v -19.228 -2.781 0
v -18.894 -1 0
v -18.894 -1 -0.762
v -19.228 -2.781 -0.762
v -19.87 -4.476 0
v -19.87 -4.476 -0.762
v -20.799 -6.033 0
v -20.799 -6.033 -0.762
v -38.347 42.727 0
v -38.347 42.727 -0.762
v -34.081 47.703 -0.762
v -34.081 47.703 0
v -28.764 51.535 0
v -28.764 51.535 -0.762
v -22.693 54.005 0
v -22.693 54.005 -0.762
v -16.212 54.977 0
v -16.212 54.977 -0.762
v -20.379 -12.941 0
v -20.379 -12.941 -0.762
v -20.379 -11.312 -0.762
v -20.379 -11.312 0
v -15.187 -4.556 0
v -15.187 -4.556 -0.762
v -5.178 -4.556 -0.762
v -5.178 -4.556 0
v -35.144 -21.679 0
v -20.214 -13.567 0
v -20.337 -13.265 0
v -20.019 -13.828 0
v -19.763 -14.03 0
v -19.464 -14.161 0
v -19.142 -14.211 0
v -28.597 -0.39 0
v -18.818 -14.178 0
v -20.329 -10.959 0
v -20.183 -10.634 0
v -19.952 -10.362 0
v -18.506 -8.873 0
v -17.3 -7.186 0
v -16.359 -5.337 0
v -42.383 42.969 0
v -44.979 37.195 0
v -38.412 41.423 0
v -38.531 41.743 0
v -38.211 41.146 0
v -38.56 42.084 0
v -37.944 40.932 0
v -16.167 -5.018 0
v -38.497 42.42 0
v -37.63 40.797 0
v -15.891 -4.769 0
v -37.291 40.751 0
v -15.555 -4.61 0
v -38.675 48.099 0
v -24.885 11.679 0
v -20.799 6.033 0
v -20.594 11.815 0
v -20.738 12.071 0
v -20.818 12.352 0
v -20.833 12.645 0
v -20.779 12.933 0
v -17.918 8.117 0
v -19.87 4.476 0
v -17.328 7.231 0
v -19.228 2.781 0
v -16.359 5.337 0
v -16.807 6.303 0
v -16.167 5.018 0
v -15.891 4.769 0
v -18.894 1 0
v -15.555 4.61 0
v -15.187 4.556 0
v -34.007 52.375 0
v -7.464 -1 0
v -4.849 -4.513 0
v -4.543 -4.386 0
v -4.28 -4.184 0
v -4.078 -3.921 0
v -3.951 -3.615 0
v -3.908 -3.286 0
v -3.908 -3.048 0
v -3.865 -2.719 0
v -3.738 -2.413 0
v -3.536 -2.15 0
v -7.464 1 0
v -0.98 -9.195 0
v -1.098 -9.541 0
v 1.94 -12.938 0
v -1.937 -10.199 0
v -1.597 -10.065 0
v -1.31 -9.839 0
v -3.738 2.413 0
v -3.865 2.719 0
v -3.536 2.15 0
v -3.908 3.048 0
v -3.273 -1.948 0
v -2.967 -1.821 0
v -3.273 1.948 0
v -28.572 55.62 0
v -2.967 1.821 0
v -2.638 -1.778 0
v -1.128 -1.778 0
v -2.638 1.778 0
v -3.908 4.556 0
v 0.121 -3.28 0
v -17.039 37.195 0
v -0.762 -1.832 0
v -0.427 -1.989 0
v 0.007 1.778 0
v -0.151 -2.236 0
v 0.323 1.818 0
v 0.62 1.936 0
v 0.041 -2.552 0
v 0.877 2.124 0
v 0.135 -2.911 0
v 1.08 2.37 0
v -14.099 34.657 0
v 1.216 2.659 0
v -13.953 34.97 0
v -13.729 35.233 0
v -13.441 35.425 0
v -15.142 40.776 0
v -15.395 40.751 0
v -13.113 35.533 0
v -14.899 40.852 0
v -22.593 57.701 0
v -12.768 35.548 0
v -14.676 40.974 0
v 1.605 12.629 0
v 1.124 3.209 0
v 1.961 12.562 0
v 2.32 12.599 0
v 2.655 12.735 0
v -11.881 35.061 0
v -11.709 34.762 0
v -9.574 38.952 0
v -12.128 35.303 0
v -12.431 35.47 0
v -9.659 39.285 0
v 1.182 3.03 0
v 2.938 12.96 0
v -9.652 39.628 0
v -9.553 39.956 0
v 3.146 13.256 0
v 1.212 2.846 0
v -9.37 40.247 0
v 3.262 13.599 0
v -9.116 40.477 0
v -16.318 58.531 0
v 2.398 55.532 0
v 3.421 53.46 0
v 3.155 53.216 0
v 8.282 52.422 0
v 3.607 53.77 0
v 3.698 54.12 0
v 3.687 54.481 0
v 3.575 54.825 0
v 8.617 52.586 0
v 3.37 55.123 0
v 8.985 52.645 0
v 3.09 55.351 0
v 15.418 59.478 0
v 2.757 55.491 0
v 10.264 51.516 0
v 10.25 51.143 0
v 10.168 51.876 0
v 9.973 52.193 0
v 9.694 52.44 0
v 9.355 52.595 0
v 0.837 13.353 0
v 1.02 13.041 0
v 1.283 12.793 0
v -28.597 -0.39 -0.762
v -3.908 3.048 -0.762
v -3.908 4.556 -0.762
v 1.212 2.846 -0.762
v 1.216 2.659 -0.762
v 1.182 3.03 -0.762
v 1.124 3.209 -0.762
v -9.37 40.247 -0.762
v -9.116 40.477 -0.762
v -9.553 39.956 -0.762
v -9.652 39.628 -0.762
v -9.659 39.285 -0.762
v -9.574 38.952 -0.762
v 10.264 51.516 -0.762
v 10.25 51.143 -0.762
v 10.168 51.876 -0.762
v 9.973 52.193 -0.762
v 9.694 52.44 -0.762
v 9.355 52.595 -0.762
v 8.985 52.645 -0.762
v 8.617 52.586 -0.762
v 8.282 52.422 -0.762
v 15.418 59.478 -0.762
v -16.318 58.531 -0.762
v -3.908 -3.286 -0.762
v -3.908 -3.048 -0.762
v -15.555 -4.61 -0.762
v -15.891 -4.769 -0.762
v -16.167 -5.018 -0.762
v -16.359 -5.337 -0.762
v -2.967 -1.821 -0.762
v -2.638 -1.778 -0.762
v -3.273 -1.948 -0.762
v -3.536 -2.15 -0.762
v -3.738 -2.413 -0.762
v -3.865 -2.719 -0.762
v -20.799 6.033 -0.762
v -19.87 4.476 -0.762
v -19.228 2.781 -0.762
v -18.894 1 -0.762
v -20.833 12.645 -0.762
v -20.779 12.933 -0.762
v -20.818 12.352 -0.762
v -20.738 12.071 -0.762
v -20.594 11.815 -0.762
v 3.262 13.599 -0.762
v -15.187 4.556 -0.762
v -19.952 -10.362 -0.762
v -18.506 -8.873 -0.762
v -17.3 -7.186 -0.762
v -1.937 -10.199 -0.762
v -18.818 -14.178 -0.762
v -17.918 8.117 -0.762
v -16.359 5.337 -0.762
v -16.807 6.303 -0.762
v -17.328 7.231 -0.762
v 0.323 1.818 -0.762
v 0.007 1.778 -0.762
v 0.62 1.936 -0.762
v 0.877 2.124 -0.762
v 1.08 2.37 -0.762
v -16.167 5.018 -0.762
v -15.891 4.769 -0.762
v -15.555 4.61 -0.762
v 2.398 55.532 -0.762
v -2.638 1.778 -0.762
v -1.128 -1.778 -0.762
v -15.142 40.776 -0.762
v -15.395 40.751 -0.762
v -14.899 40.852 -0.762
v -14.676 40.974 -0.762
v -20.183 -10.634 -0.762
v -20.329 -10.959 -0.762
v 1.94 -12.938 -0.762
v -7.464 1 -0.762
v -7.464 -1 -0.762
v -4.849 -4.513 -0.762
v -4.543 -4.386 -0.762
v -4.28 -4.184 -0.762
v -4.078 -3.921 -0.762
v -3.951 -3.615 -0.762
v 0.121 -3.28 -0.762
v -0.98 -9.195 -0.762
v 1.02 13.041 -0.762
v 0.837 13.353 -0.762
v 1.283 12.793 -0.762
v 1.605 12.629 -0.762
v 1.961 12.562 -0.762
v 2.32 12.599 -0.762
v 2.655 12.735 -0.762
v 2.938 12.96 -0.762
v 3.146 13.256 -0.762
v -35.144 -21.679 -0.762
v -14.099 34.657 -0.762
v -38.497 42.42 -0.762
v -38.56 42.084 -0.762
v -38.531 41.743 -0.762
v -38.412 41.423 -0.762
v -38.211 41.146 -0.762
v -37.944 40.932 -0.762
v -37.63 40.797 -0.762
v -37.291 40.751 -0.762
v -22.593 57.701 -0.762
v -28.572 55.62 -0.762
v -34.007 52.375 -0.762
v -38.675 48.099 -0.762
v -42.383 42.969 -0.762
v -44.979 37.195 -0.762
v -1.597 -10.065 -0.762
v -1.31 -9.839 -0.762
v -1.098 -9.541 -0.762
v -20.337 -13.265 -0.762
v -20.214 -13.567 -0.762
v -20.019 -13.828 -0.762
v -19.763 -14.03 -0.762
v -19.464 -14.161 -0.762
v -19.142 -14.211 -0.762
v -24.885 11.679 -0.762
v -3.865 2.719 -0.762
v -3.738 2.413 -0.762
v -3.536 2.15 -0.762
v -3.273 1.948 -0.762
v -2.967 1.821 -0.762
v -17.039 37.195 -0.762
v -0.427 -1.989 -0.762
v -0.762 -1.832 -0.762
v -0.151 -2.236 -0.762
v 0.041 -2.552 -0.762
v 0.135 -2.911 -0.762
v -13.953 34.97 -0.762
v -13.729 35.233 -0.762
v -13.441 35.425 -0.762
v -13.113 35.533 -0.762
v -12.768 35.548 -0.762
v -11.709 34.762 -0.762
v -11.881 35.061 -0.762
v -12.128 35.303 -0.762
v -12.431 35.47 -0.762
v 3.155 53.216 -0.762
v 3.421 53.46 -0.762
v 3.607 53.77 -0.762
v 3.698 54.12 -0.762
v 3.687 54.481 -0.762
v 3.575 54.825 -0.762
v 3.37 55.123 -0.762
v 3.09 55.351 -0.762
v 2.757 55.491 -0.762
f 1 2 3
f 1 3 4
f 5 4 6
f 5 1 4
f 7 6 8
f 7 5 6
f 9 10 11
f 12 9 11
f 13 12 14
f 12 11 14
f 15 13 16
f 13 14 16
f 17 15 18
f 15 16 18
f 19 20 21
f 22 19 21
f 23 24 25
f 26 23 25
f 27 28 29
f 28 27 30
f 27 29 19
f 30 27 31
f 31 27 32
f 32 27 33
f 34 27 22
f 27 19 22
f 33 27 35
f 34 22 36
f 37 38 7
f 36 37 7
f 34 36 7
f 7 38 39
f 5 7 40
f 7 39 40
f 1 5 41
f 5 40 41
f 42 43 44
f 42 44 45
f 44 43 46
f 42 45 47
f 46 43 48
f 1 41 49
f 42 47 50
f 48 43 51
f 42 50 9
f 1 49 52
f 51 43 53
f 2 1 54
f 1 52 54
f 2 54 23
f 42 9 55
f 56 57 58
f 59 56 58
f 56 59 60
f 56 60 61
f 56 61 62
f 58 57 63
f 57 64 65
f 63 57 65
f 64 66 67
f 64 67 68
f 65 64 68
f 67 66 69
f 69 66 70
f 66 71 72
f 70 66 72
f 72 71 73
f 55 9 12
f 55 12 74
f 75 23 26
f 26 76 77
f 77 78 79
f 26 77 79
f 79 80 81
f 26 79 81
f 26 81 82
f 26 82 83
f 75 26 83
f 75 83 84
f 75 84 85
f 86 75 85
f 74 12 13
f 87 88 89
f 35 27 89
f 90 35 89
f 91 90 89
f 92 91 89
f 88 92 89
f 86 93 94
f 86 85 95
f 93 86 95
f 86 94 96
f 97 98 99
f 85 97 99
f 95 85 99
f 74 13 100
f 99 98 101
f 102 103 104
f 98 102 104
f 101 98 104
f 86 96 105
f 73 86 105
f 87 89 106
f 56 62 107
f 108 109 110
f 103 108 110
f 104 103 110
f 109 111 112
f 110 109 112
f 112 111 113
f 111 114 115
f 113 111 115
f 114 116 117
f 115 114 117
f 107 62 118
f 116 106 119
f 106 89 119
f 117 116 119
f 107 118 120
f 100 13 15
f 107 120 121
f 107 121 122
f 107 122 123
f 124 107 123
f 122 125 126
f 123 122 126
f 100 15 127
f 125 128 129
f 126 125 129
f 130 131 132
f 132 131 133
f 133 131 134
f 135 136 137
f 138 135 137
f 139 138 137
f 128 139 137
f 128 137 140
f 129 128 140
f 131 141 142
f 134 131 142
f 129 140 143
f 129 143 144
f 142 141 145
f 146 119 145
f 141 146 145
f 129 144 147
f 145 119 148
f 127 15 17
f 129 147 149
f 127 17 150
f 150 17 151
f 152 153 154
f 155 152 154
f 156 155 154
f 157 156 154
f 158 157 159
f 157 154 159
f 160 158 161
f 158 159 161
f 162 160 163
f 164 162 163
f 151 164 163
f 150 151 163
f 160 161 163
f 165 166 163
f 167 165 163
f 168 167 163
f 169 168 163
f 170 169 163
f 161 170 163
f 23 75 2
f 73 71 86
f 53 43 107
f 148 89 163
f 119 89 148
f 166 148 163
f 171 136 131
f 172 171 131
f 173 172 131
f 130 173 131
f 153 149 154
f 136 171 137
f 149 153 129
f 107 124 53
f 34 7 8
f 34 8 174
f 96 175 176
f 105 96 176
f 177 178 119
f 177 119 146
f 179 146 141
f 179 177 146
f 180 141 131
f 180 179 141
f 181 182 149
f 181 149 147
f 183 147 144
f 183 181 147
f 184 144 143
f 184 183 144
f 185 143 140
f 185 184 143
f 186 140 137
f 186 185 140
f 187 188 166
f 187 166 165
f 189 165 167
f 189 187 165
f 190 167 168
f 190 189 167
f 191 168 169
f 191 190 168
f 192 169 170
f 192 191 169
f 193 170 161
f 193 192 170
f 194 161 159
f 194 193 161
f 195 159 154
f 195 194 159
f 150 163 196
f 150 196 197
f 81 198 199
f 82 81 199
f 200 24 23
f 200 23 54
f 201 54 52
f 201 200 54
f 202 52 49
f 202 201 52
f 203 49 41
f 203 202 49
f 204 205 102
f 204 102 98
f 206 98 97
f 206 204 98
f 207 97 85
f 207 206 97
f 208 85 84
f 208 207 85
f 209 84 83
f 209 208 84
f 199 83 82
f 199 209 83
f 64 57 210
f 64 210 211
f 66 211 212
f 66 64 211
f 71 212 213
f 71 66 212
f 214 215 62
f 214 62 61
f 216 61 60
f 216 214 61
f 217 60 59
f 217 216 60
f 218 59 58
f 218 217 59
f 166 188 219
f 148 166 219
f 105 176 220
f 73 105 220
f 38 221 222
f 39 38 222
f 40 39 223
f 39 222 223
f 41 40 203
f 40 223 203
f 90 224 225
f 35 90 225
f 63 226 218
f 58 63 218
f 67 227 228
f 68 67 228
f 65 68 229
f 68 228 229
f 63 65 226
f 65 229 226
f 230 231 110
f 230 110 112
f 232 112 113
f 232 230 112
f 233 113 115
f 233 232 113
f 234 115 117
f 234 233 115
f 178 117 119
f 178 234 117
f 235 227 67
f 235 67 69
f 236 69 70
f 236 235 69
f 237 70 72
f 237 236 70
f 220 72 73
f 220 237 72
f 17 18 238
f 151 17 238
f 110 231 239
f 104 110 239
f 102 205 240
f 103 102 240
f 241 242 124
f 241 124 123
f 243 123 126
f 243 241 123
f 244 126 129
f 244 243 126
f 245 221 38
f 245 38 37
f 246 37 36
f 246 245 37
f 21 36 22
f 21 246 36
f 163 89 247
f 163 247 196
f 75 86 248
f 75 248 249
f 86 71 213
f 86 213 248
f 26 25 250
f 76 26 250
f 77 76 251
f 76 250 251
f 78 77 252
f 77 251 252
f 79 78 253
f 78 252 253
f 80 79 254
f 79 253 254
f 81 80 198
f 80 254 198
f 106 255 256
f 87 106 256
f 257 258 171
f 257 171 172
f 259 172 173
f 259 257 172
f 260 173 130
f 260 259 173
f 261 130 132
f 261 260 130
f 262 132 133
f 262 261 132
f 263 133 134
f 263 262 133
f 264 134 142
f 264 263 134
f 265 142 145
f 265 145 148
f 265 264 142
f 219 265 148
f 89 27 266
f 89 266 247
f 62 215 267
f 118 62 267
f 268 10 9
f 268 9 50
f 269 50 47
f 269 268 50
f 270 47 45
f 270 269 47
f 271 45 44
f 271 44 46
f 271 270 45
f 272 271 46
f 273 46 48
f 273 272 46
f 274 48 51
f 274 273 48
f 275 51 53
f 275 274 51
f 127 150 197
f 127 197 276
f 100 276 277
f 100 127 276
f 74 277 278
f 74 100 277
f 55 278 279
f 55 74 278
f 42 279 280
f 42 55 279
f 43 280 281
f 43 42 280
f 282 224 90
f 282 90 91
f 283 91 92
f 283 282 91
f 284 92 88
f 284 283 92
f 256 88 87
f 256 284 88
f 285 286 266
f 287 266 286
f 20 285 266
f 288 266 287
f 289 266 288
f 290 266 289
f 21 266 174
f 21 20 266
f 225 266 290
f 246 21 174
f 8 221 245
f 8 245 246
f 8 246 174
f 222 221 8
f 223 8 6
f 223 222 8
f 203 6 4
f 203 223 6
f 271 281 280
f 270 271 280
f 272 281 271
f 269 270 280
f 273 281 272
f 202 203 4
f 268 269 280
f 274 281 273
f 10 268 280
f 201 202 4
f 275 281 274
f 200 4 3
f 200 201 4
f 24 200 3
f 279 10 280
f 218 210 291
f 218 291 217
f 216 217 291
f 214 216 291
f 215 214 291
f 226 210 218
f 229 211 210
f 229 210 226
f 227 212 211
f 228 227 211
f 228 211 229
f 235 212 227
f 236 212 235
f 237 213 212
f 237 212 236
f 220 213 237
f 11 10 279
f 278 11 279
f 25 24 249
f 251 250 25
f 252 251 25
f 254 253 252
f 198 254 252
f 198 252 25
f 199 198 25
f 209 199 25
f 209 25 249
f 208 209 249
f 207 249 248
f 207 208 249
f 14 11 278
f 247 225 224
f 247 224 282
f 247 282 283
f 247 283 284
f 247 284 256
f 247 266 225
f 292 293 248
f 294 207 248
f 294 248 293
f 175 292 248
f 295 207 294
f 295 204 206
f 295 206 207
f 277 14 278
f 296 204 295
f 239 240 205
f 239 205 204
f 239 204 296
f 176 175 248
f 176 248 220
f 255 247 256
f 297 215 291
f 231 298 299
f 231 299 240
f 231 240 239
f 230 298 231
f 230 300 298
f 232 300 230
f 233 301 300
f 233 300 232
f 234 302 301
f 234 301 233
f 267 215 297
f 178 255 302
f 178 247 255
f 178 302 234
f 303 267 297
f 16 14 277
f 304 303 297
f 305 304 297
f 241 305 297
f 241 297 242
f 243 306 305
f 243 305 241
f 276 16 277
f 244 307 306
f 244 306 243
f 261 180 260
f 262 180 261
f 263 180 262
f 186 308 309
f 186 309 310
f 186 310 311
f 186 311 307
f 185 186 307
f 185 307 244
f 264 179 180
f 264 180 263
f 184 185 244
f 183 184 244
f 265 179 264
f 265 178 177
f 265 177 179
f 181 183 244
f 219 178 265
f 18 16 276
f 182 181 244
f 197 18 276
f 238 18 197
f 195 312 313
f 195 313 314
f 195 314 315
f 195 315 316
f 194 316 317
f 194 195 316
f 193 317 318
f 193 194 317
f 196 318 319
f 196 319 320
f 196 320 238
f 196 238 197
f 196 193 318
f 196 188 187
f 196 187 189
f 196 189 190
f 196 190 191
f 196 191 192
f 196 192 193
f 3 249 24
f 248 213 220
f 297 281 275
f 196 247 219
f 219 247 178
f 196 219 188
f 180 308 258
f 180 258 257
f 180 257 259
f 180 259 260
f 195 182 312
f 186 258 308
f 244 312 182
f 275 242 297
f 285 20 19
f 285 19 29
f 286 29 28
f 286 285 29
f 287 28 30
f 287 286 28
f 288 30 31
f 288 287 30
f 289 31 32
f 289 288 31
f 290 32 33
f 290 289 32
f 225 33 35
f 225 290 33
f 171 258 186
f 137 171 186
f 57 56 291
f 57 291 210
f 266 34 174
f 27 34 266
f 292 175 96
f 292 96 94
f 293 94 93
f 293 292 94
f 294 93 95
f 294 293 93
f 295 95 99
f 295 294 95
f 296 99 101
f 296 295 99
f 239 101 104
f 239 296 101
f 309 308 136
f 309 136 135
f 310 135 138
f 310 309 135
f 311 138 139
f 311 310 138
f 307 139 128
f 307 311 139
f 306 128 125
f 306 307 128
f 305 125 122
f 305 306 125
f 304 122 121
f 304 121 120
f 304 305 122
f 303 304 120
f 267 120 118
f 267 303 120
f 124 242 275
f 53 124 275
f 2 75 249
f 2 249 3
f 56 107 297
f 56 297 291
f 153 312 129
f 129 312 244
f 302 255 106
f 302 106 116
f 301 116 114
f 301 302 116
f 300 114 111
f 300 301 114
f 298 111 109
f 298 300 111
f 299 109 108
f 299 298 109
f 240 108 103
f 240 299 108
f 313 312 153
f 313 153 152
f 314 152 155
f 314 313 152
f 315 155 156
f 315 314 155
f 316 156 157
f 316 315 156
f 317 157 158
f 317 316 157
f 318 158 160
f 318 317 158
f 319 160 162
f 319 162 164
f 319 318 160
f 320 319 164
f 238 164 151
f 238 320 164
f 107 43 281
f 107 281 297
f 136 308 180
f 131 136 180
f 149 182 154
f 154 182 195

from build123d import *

# Parameters (mm, degrees)
BOSS_EXTRUDE2_DEPTH = 0.762
CUT_EXTRUDE1_DEPTH  = 2.54
FILLET1_R           = 1.27
FILLET2_R           = 1.27


with BuildPart() as part:
    # Sketch1 → Boss-Extrude2 (new body)
    with BuildSketch(Plane.XY):
        with BuildLine():
            Line((-17.038837989, 37.195), (-24.885307058, 11.67932501))
            Line((-24.885307058, 11.67932501), (-20.799118841, 6.0325))
            ThreePointArc((-20.799118841, 6.0325), (-19.511844062, 3.642975475), (-18.894118841, 1))
            Line((-18.894118841, 1), (-7.464118841, 1))
            Line((-7.464118841, 1), (-7.464118841, -1))
            Line((-7.464118841, -1), (-18.894118841, -1))
            ThreePointArc((-18.894118841, -1), (-19.511844062, -3.642975475), (-20.799118841, -6.0325))
            Line((-20.799118841, -6.0325), (-28.596784868, -0.38990775))
            Line((-28.596784868, -0.38990775), (-35.143553898, -21.67913088))
            Line((-35.143553898, -21.67913088), (1.940239682, -12.938292607))
            Line((1.940239682, -12.938292607), (15.418184296, 59.478146197))
            Line((15.418184296, 59.478146197), (-16.317685222, 58.531))
            ThreePointArc((-16.317685222, 58.531), (-34.007299879, 52.375275454), (-44.978837989, 37.195))
            Line((-44.978837989, 37.195), (-17.038837989, 37.195))
        make_face()
    extrude(amount=-BOSS_EXTRUDE2_DEPTH)

    # Sketch2 → Cut-Extrude1 (cut)
    with BuildSketch(Plane(origin=(0, 0, -0.762), x_dir=(-1, 0, 0), z_dir=(0, 0, -1))):
        Polygon((9.959013349, 39.898911244), (-10.811031118, 54.15844292), (-2.469426207, 9.339344835), align=None)
        with BuildLine():
            Line((16.211604848, 54.976582614), (-6.716661044, 55.660868886))
            Line((-6.716661044, 55.660868886), (15.000646844, 40.751))
            Line((15.000646844, 40.751), (39.552648945, 40.751))
            ThreePointArc((39.552648945, 40.751), (29.764823586, 50.952881409), (16.211604848, 54.976582614))
        make_face()
        with BuildLine():
            Line((13.163553789, 37.698855968), (12.959946202, 37.838641361))
            Line((12.959946202, 37.838641361), (-1.264200274, 2.863715758))
            Line((-1.264200274, 2.863715758), (-1.0621299, 1.778))
            Line((-1.0621299, 1.778), (3.908118841, 1.778))
            Line((3.908118841, 1.778), (3.908118841, 4.556))
            Line((3.908118841, 4.556), (16.060442021, 4.556))
            ThreePointArc((16.060442021, 4.556), (16.85953464, 6.404305379), (17.918263947, 8.117160903))
            Line((17.918263947, 8.117160903), (20.965443108, 12.328148402))
            Line((20.965443108, 12.328148402), (13.163553789, 37.698855968))
        make_face()
        with BuildLine():
            Line((3.908118841, -1.778), (-0.400297147, -1.778))
            Line((-0.400297147, -1.778), (1.131614758, -10.008899288))
            Line((1.131614758, -10.008899288), (20.37916729, -14.545645063))
            Line((20.37916729, -14.545645063), (20.37916729, -10.725757063))
            ThreePointArc((20.37916729, -10.725757063), (17.792273547, -7.940143054), (16.060442021, -4.556))
            Line((16.060442021, -4.556), (3.908118841, -4.556))
            Line((3.908118841, -4.556), (3.908118841, -1.778))
        make_face()
    extrude(amount=-CUT_EXTRUDE1_DEPTH, mode=Mode.SUBTRACT)

    # Fillet1
    # the kernel refuses this fillet: 1.27 mm, written as the material it adds along each edge
    with BuildSketch(Plane(origin=(-39.552648945, 40.751, -0.762), x_dir=(0.5208478104072599, 0.8536495524475856, 0), z_dir=(0, 0, 1))) as fillet1_piece_1:
        with BuildLine():
            CenterArc((2.261930285, -1.268884618), FILLET1_R, 87.598517958, 123.790620182)
            Line((1.177795353, -1.930361337), (0, 0))
            ThreePointArc((0, 0), (1.157572593, 0.024262667), (2.315145186, 0))
        make_face()
    extrude(amount=0.762)
    with BuildSketch(Plane(origin=(-15.000646844, 40.751, -0.762), x_dir=(-1, 0, 0), z_dir=(0, 0, 1))) as fillet1_piece_2:
        with BuildLine():
            CenterArc((FILLET1_R * 0.310233467687, -FILLET1_R), FILLET1_R, 90, 34.471278604)
            Line((-FILLET1_R * 0.2557595777, -FILLET1_R * 0.175589985157), (0, 0))
            Line((0, 0), (FILLET1_R * 0.310233467687, 0))
        make_face()
    extrude(amount=0.762)
    with BuildSketch(Plane(origin=(6.716661044, 55.660868886, -0.762), x_dir=(-0.9995549454578584, -0.029831376279645935, 0), z_dir=(0, 0, 1))) as fillet1_piece_3:
        with BuildLine():
            CenterArc((FILLET1_R * 3.40189361791, FILLET1_R), FILLET1_R, 122.761813037, 147.238186963)
            Line((FILLET1_R * 2.86074575566, FILLET1_R * 1.84092745893), (0, 0))
            Line((0, 0), (FILLET1_R * 3.40189361791, 0))
        make_face()
    extrude(amount=0.762)
    with BuildSketch(Plane(origin=(-16.060442021, -4.556, -0.762), x_dir=(1, 0, 0), z_dir=(0, 0, 1))) as fillet1_piece_4:
        with BuildLine():
            CenterArc((0.873205275, -1.27), FILLET1_R, 90, 67.330529822)
            ThreePointArc((-0.298679081, -0.780523691), (-0.143449411, -0.392515792), (0, 0))
            Line((0, 0), (0.873205275, 0))
        make_face()
    extrude(amount=0.762)
    with BuildSketch(Plane(origin=(-20.37916729, -10.725757063, -0.762), x_dir=(0.7616549867095258, 0.6479827784906881, 0), z_dir=(0, 0, 1))) as fillet1_piece_5:
        with BuildLine():
            CenterArc((0.587183206, -1.269738966), FILLET1_R, 91.161693546, 48.448622341)
            Line((-0.380118627, -0.446800838), (0, 0))
            ThreePointArc((0, 0), (0.28071762, -0.002845925), (0.561435241, 0))
        make_face()
    extrude(amount=0.762)
    with BuildSketch(Plane(origin=(-20.37916729, -14.545645063, -0.762), x_dir=(0, 1, 0), z_dir=(0, 0, 1))) as fillet1_piece_6:
        with BuildLine():
            CenterArc((FILLET1_R * 1.26310805209, -FILLET1_R), FILLET1_R, 90, 103.262828677)
            Line((FILLET1_R * 0.289780136608, -FILLET1_R * 1.22941832738), (0, 0))
            Line((0, 0), (FILLET1_R * 1.26310805209, 0))
        make_face()
    extrude(amount=0.762)
    with BuildSketch(Plane(origin=(-1.131614758, -10.008899288, -0.762), x_dir=(-0.9733279154855742, -0.22941832737710197, 0), z_dir=(0, 0, 1))) as fillet1_piece_7:
        with BuildLine():
            CenterArc((FILLET1_R * 0.651818100075, -FILLET1_R), FILLET1_R, 90, 66.194073158)
            Line((-FILLET1_R * 0.263099818984, -FILLET1_R * 0.596360059726), (0, 0))
            Line((0, 0), (FILLET1_R * 0.651818100075, 0))
        make_face()
    extrude(amount=0.762)
    with BuildSketch(Plane(origin=(0.400297147, -1.778, -0.762), x_dir=(-1, 0, 0), z_dir=(0, 0, 1))) as fillet1_piece_8:
        with BuildLine():
            CenterArc((FILLET1_R * 1.20328955763, FILLET1_R), FILLET1_R, 169.456901836, 100.543098164)
            Line((FILLET1_R * 0.220172006676, FILLET1_R * 1.182975083), (0, 0))
            Line((0, 0), (FILLET1_R * 1.20328955763, 0))
        make_face()
    extrude(amount=0.762)
    with BuildSketch(Plane(origin=(-3.908118841, -1.778, -0.762), x_dir=(1, 0, 0), z_dir=(0, 0, 1)), Plane(origin=(-3.908118841, 1.778, -0.762), x_dir=(0, 1, 0), z_dir=(0, 0, 1))) as fillet1_piece_9:
        with BuildLine():
            CenterArc((FILLET1_R, -FILLET1_R), FILLET1_R, 90, 90)
            Line((0, -FILLET1_R), (0, 0))
            Line((0, 0), (FILLET1_R, 0))
        make_face()
    extrude(amount=0.762)
    with BuildSketch(Plane(origin=(10.811031118, 54.15844292, -0.762), x_dir=(-0.8244100148431994, -0.5659930453868101, 0), z_dir=(0, 0, 1))) as fillet1_piece_10:
        with BuildLine():
            CenterArc((FILLET1_R * 2.41507052303, FILLET1_R), FILLET1_R, 134.985623232, 135.014376768)
            Line((FILLET1_R * 1.7081411927, FILLET1_R * 1.70728418753), (0, 0))
            Line((0, 0), (FILLET1_R * 2.41507052303, 0))
        make_face()
    extrude(amount=0.762)
    with BuildSketch(Plane(origin=(-9.959013349, 39.898911244, -0.762), x_dir=(0.824410014843199, 0.5659930453868107, 0), z_dir=(0, 0, 1))) as fillet1_piece_11:
        with BuildLine():
            CenterArc((FILLET1_R * 0.804884205906, -FILLET1_R), FILLET1_R, 90, 77.660077981)
            Line((-FILLET1_R * 0.172012698042, -FILLET1_R * 0.786288888787), (0, 0))
            Line((0, 0), (FILLET1_R * 0.804884205906, 0))
        make_face()
    extrude(amount=0.762)
    with BuildSketch(Plane(origin=(2.469426207, 9.339344835, -0.762), x_dir=(-0.37673127332714895, 0.9263225937530105, 0), z_dir=(0, 0, 1))) as fillet1_piece_12:
        with BuildLine():
            CenterArc((FILLET1_R * 3.41150341271, -FILLET1_R), FILLET1_R, 90, 147.325545251)
            Line((FILLET1_R * 2.87163833244, -FILLET1_R * 1.84175156376), (0, 0))
            Line((0, 0), (FILLET1_R * 3.41150341271, 0))
        make_face()
    extrude(amount=0.762)
    with BuildSketch(Plane(origin=(-16.060442021, 4.556, -0.762), x_dir=(-0.35739171022603367, 0.9339545842607717, 0), z_dir=(0, 0, 1))) as fillet1_piece_13:
        with BuildLine():
            CenterArc((0.874045995, -1.269421541), FILLET1_R, 91.729372014, 67.330529822)
            Line((-0.312076327, -0.815534069), (0, 0))
            ThreePointArc((0, 0), (0.417859553, -0.006306655), (0.835719106, 0))
        make_face()
    extrude(amount=0.762)
    with BuildSketch(Plane(origin=(1.0621299, 1.778, -0.762), x_dir=(-1, 0, 0), z_dir=(0, 0, 1))) as fillet1_piece_14:
        with BuildLine():
            CenterArc((FILLET1_R * 0.831055163452, -FILLET1_R), FILLET1_R, 90, 79.456901836)
            Line((-FILLET1_R * 0.152062387507, -FILLET1_R * 0.817024917004), (0, 0))
            Line((0, 0), (FILLET1_R * 0.831055163452, 0))
        make_face()
    extrude(amount=0.762)
    with BuildSketch(Plane(origin=(1.264200274, 2.863715758, -0.762), x_dir=(-0.18297508299575613, -0.9831175509585292, 0), z_dir=(0, 0, 1))) as fillet1_piece_15:
        with BuildLine():
            CenterArc((FILLET1_R * 0.293125897595, -FILLET1_R), FILLET1_R, 90, 32.674454749)
            Line((-FILLET1_R * 0.24673918268, -FILLET1_R * 0.158248436236), (0, 0))
            Line((0, 0), (FILLET1_R * 0.293125897595, 0))
        make_face()
    extrude(amount=0.762)
    with BuildSketch(Plane(origin=(-13.163553789, 37.698855968, -0.762), x_dir=(0.8244100148432169, 0.5659930453867846, 0), z_dir=(0, 0, 1))) as fillet1_piece_16:
        with BuildLine():
            CenterArc((0.466869862, -1.250818003), FILLET1_R, 99.970819011, 28.464420859)
            Line((-0.322599825, -0.256012688), (0, 0))
            Line((0, 0), (0.246973695, 0))
        make_face()
    extrude(amount=0.762)
    with BuildSketch(Plane(origin=(-20.965443108, 12.328148402, -0.762), x_dir=(0.29393158388003876, 0.9558264612353917, 0), z_dir=(0, 0, 1))) as fillet1_piece_17:
        with BuildLine():
            CenterArc((FILLET1_R * 0.49840674513, -FILLET1_R), FILLET1_R, 90, 52.983950443)
            Line((-FILLET1_R * 0.300060154598, -FILLET1_R * 0.397961288587), (0, 0))
            Line((0, 0), (FILLET1_R * 0.49840674513, 0))
        make_face()
    extrude(amount=0.762)
    # the kernel refuses this fillet: 1.27 mm, written as the material it takes off along each edge
    with BuildSketch(Plane(origin=(-3.908118841, -4.556, -3.937), x_dir=(0, 1, 0), z_dir=(0, 0, 1))) as fillet1_2_piece_1:
        with BuildLine():
            CenterArc((FILLET1_R, FILLET1_R), FILLET1_R, 180, 90)
            Line((0, FILLET1_R), (0, 0))
            Line((0, 0), (FILLET1_R, 0))
        make_face()
    extrude(amount=7.112, mode=Mode.SUBTRACT)

    # Fillet2
    # the kernel refuses this fillet: 1.27 mm, written as the material it adds along each edge
    with BuildSketch(Plane(origin=(-12.959946202, 37.838641361, -0.762), x_dir=(-0.33704949641536375, -0.9414869287282484, 0), z_dir=(0, 0, 1))) as fillet2_piece_1:
        with BuildLine():
            CenterArc((3.321849705, 1.268688867), FILLET2_R, 131.828571636, 140.775161889)
            Line((2.474881455, 2.215021147), (2.390184631, 2.309654375))
            Line((2.390184631, 2.309654375), (-0.084696825, 0.094633228))
            Line((-0.084696825, 0.094633228), (-0.055395427, -0.114281874))
            ThreePointArc((-0.055395427, -0.114281874), (0.617417306, -0.252739018), (3.385312737, -0.126868887))
            Line((3.385312737, -0.126868887), (3.37954337, 0))
        make_face()
    extrude(amount=0.762)


solid = part.part
